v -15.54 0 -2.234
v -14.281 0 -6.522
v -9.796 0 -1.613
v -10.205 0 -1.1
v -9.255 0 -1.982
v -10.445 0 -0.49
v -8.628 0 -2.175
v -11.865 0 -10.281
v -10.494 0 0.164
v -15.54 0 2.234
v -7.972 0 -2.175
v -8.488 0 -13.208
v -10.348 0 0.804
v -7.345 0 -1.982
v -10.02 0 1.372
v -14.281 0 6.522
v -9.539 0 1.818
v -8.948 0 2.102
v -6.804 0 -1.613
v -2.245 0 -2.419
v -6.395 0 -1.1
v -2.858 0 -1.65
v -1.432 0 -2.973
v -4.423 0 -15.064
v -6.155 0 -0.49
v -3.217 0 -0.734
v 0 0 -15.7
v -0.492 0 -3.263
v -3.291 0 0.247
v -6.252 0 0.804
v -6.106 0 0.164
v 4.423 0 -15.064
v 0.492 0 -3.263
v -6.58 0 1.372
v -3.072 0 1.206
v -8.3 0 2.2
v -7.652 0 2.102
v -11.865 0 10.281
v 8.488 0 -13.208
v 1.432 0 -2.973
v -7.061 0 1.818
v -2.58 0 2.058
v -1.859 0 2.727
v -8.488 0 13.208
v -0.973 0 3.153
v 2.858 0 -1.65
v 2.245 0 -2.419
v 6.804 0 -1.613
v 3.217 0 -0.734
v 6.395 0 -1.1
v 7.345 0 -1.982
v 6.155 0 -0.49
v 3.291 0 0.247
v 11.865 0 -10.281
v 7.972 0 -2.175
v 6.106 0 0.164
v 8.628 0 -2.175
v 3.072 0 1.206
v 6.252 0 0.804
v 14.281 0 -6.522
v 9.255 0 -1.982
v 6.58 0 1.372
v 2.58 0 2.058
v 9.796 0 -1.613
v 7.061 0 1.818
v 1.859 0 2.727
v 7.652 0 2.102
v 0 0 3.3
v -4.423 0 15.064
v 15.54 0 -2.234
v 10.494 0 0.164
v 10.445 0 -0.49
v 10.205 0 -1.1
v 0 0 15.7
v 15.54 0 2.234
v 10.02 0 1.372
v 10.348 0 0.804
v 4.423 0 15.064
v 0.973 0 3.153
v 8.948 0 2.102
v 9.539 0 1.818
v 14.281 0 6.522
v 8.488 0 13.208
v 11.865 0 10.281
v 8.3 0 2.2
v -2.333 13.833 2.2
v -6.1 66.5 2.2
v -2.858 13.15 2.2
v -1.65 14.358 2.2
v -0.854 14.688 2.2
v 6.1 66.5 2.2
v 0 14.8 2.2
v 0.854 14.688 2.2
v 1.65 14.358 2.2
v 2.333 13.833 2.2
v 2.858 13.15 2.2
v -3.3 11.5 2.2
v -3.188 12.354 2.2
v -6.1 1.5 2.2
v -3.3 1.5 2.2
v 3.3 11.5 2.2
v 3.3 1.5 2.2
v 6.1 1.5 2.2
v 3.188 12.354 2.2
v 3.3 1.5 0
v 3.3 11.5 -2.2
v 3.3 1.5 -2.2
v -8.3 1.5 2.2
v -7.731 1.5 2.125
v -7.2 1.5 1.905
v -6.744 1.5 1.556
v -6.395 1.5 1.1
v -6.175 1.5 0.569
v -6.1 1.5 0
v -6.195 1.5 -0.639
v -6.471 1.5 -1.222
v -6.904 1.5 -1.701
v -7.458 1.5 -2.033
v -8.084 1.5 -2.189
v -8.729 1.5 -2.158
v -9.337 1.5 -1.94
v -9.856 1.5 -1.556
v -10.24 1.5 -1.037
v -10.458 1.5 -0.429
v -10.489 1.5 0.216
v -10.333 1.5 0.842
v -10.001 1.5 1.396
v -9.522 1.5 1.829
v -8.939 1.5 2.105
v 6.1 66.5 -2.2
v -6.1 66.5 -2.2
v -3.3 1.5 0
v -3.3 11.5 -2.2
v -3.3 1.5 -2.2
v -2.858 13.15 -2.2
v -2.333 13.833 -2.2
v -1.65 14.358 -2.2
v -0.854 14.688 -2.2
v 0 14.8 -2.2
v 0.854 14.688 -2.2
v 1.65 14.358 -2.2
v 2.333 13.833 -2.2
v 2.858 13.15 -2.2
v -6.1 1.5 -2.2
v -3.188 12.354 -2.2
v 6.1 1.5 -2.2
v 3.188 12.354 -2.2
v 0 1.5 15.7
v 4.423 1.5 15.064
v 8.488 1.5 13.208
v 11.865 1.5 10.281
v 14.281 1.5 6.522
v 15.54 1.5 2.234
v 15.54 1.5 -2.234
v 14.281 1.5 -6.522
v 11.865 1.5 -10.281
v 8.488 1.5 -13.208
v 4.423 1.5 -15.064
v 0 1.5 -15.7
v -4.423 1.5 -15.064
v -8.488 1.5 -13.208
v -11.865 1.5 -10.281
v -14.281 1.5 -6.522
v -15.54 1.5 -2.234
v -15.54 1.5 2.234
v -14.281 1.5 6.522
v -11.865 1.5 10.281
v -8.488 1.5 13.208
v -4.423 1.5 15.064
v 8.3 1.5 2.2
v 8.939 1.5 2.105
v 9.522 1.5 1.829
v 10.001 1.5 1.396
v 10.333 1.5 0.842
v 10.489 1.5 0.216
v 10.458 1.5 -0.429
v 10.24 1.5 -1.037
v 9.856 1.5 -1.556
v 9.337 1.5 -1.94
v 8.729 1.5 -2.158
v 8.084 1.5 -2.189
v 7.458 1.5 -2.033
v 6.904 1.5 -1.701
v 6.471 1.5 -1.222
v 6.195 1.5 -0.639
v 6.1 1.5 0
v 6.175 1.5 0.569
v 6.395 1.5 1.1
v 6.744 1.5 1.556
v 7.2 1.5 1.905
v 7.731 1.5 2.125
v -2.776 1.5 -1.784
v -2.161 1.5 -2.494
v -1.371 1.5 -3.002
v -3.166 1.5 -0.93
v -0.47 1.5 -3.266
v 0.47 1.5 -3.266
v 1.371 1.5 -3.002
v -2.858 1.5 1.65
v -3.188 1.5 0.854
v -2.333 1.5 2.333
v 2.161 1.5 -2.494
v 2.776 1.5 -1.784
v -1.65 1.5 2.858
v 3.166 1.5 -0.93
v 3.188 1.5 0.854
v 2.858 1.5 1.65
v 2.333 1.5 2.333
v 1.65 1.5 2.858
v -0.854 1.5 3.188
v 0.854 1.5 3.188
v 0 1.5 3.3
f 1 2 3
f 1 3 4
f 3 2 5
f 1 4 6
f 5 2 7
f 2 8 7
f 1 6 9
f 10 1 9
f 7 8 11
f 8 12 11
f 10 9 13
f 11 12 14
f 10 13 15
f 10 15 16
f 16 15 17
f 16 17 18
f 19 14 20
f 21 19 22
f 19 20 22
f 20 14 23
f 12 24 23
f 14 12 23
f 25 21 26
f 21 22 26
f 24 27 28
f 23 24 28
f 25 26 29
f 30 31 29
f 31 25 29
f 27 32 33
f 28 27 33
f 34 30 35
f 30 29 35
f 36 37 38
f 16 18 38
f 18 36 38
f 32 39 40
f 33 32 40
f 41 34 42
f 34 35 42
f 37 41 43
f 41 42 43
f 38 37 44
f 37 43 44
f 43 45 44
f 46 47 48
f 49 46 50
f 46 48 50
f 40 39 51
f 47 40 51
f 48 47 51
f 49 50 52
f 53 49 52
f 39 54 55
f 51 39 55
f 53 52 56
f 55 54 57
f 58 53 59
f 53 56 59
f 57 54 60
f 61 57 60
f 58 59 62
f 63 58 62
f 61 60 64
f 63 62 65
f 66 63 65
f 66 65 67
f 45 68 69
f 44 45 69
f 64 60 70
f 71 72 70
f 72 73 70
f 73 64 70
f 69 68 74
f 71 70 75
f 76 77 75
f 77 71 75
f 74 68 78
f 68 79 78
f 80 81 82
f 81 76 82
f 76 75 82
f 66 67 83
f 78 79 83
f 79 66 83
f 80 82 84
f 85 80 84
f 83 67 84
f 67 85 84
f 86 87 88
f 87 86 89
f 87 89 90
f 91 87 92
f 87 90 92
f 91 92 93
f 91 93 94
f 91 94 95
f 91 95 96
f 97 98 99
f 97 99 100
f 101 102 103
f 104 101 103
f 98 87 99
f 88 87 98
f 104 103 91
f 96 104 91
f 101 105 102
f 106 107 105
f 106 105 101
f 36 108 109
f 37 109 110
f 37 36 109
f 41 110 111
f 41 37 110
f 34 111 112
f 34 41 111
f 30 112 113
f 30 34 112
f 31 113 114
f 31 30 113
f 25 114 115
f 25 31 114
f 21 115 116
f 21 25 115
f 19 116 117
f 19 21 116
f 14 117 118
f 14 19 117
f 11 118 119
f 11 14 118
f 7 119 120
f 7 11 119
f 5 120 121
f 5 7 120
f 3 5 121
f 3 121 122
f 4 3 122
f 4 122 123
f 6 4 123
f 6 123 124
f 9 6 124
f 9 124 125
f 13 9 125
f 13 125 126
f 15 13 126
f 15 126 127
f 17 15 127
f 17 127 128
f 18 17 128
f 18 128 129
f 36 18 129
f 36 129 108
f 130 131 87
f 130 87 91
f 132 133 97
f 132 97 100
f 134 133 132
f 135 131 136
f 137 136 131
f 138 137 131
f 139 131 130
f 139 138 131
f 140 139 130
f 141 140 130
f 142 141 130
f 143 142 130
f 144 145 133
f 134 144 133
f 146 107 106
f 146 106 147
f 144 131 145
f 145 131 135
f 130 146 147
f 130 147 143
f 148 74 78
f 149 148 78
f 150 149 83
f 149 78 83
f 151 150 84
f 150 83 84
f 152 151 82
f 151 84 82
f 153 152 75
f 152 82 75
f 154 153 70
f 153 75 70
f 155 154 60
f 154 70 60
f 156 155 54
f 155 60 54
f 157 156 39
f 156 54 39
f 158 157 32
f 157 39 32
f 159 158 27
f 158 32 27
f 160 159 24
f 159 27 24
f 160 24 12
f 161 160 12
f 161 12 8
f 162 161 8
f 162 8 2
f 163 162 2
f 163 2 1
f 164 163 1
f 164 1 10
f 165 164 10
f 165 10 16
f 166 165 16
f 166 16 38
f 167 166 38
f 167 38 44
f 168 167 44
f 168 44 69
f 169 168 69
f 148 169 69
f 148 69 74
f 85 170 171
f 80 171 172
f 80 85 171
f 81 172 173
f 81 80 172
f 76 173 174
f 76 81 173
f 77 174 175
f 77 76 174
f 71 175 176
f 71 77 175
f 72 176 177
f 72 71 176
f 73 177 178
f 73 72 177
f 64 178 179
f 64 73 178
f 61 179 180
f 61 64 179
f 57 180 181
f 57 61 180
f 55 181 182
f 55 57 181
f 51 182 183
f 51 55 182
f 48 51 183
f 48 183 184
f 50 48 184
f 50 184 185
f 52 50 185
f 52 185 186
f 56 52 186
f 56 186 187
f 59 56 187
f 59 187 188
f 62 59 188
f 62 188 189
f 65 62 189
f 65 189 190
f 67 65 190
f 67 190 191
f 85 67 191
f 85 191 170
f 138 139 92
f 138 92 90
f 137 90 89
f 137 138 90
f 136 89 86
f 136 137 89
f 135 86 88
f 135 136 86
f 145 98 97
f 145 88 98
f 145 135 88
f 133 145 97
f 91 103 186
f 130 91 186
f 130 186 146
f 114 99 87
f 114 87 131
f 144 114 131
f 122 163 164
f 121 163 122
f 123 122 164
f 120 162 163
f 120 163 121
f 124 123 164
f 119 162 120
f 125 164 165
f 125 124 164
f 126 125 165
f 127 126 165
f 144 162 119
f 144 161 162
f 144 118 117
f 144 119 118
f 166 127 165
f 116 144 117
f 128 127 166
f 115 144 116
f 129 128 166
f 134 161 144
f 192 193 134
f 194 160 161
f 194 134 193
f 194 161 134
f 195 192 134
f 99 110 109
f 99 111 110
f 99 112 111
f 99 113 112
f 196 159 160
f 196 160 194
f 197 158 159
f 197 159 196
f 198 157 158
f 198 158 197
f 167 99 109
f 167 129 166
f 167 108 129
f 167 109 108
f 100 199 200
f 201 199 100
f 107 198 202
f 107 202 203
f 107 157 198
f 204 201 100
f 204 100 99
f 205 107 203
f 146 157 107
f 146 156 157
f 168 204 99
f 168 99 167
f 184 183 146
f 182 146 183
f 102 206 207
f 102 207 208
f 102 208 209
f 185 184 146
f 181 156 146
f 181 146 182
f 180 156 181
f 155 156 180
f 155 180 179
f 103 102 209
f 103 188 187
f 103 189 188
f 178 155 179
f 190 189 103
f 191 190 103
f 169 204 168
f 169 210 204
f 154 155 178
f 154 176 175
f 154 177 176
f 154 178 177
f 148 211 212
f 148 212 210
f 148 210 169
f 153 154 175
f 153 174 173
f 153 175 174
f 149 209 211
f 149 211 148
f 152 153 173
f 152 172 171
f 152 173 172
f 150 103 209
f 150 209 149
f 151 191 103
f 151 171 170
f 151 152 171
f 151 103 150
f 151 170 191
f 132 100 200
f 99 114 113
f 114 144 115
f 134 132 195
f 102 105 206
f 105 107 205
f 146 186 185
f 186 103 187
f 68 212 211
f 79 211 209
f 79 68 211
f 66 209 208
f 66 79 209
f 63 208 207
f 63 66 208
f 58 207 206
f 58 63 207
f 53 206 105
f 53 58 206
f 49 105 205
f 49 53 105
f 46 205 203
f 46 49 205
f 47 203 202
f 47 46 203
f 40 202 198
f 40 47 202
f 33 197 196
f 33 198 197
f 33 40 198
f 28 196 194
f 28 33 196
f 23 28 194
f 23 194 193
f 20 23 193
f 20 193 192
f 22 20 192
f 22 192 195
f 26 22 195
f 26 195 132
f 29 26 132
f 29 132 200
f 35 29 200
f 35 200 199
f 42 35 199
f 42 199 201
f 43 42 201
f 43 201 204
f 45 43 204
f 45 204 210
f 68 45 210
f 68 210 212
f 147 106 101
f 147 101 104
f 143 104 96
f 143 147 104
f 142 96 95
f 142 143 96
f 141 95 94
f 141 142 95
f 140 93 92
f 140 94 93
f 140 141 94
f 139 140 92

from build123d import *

# Parameters (mm, degrees)
SKETCH1_R               = 15.7
SKETCH1_R_2             = 3.3
SKETCH1_R_3             = 2.2
BOSS_EXTRUDE1_DEPTH     = 1.5
SKETCH2_W               = 12.2
SKETCH2_H               = 4.4
BOSS_EXTRUDE2_DEPTH     = 65
CUT_EXTRUDE1_DEPTH      = 71.633915366
CUT_EXTRUDE1_DEPTH_BACK = 90


with BuildPart() as part:
    # Sketch1 → Boss-Extrude1 (new body)
    with BuildSketch(Plane(origin=(0, 0, 0), x_dir=(1, 0, 0), z_dir=(0, 1, 0))):
        with Locations(Location((0, 0, 0), (0, 0, 270))):
            Circle(SKETCH1_R)
        with Locations(Location((0, 0, 0), (0, 0, 270))):
            Circle(SKETCH1_R_2, mode=Mode.SUBTRACT)
        with Locations(Location((-8.3, 0, 0), (0, 0, 270))):
            Circle(SKETCH1_R_3, mode=Mode.SUBTRACT)
        with Locations(Location((8.3, 0, 0), (0, 0, 270))):
            Circle(SKETCH1_R_3, mode=Mode.SUBTRACT)
    extrude(amount=BOSS_EXTRUDE1_DEPTH)

    # Sketch2 → Boss-Extrude2 (add)
    with BuildSketch(Plane(origin=(0, 1.5, 0), x_dir=(1, 0, 0), z_dir=(0, 1, 0))):
        Rectangle(SKETCH2_W, SKETCH2_H)
    extrude(amount=BOSS_EXTRUDE2_DEPTH)

    # Sketch4 → Cut-Extrude1 (cut, two sides: drawn at the far end of the back side and taken through both)
    with BuildSketch(Plane.XY.offset(2.2).offset(-CUT_EXTRUDE1_DEPTH_BACK)):
        with BuildLine():
            ThreePointArc((3.3, 11.5), (2.333452378, 13.833452378), (0, 14.8))
            Line((0, 14.8), (0, 1.5))
            Line((0, 1.5), (2.459674775, 1.5))
            Line((2.459674775, 1.5), (3.3, 1.5))
            Line((3.3, 1.5), (3.3, 11.5))
        make_face()
        with BuildLine():
            Line((-3.3, 11.5), (-3.3, 1.5))
            Line((-3.3, 1.5), (-2.459674775, 1.5))
            Line((-2.459674775, 1.5), (0, 1.5))
            Line((0, 1.5), (0, 14.8))
            ThreePointArc((0, 14.8), (-2.333452378, 13.833452378), (-3.3, 11.5))
        make_face()
    extrude(amount=CUT_EXTRUDE1_DEPTH + CUT_EXTRUDE1_DEPTH_BACK, mode=Mode.SUBTRACT)


solid = part.part
